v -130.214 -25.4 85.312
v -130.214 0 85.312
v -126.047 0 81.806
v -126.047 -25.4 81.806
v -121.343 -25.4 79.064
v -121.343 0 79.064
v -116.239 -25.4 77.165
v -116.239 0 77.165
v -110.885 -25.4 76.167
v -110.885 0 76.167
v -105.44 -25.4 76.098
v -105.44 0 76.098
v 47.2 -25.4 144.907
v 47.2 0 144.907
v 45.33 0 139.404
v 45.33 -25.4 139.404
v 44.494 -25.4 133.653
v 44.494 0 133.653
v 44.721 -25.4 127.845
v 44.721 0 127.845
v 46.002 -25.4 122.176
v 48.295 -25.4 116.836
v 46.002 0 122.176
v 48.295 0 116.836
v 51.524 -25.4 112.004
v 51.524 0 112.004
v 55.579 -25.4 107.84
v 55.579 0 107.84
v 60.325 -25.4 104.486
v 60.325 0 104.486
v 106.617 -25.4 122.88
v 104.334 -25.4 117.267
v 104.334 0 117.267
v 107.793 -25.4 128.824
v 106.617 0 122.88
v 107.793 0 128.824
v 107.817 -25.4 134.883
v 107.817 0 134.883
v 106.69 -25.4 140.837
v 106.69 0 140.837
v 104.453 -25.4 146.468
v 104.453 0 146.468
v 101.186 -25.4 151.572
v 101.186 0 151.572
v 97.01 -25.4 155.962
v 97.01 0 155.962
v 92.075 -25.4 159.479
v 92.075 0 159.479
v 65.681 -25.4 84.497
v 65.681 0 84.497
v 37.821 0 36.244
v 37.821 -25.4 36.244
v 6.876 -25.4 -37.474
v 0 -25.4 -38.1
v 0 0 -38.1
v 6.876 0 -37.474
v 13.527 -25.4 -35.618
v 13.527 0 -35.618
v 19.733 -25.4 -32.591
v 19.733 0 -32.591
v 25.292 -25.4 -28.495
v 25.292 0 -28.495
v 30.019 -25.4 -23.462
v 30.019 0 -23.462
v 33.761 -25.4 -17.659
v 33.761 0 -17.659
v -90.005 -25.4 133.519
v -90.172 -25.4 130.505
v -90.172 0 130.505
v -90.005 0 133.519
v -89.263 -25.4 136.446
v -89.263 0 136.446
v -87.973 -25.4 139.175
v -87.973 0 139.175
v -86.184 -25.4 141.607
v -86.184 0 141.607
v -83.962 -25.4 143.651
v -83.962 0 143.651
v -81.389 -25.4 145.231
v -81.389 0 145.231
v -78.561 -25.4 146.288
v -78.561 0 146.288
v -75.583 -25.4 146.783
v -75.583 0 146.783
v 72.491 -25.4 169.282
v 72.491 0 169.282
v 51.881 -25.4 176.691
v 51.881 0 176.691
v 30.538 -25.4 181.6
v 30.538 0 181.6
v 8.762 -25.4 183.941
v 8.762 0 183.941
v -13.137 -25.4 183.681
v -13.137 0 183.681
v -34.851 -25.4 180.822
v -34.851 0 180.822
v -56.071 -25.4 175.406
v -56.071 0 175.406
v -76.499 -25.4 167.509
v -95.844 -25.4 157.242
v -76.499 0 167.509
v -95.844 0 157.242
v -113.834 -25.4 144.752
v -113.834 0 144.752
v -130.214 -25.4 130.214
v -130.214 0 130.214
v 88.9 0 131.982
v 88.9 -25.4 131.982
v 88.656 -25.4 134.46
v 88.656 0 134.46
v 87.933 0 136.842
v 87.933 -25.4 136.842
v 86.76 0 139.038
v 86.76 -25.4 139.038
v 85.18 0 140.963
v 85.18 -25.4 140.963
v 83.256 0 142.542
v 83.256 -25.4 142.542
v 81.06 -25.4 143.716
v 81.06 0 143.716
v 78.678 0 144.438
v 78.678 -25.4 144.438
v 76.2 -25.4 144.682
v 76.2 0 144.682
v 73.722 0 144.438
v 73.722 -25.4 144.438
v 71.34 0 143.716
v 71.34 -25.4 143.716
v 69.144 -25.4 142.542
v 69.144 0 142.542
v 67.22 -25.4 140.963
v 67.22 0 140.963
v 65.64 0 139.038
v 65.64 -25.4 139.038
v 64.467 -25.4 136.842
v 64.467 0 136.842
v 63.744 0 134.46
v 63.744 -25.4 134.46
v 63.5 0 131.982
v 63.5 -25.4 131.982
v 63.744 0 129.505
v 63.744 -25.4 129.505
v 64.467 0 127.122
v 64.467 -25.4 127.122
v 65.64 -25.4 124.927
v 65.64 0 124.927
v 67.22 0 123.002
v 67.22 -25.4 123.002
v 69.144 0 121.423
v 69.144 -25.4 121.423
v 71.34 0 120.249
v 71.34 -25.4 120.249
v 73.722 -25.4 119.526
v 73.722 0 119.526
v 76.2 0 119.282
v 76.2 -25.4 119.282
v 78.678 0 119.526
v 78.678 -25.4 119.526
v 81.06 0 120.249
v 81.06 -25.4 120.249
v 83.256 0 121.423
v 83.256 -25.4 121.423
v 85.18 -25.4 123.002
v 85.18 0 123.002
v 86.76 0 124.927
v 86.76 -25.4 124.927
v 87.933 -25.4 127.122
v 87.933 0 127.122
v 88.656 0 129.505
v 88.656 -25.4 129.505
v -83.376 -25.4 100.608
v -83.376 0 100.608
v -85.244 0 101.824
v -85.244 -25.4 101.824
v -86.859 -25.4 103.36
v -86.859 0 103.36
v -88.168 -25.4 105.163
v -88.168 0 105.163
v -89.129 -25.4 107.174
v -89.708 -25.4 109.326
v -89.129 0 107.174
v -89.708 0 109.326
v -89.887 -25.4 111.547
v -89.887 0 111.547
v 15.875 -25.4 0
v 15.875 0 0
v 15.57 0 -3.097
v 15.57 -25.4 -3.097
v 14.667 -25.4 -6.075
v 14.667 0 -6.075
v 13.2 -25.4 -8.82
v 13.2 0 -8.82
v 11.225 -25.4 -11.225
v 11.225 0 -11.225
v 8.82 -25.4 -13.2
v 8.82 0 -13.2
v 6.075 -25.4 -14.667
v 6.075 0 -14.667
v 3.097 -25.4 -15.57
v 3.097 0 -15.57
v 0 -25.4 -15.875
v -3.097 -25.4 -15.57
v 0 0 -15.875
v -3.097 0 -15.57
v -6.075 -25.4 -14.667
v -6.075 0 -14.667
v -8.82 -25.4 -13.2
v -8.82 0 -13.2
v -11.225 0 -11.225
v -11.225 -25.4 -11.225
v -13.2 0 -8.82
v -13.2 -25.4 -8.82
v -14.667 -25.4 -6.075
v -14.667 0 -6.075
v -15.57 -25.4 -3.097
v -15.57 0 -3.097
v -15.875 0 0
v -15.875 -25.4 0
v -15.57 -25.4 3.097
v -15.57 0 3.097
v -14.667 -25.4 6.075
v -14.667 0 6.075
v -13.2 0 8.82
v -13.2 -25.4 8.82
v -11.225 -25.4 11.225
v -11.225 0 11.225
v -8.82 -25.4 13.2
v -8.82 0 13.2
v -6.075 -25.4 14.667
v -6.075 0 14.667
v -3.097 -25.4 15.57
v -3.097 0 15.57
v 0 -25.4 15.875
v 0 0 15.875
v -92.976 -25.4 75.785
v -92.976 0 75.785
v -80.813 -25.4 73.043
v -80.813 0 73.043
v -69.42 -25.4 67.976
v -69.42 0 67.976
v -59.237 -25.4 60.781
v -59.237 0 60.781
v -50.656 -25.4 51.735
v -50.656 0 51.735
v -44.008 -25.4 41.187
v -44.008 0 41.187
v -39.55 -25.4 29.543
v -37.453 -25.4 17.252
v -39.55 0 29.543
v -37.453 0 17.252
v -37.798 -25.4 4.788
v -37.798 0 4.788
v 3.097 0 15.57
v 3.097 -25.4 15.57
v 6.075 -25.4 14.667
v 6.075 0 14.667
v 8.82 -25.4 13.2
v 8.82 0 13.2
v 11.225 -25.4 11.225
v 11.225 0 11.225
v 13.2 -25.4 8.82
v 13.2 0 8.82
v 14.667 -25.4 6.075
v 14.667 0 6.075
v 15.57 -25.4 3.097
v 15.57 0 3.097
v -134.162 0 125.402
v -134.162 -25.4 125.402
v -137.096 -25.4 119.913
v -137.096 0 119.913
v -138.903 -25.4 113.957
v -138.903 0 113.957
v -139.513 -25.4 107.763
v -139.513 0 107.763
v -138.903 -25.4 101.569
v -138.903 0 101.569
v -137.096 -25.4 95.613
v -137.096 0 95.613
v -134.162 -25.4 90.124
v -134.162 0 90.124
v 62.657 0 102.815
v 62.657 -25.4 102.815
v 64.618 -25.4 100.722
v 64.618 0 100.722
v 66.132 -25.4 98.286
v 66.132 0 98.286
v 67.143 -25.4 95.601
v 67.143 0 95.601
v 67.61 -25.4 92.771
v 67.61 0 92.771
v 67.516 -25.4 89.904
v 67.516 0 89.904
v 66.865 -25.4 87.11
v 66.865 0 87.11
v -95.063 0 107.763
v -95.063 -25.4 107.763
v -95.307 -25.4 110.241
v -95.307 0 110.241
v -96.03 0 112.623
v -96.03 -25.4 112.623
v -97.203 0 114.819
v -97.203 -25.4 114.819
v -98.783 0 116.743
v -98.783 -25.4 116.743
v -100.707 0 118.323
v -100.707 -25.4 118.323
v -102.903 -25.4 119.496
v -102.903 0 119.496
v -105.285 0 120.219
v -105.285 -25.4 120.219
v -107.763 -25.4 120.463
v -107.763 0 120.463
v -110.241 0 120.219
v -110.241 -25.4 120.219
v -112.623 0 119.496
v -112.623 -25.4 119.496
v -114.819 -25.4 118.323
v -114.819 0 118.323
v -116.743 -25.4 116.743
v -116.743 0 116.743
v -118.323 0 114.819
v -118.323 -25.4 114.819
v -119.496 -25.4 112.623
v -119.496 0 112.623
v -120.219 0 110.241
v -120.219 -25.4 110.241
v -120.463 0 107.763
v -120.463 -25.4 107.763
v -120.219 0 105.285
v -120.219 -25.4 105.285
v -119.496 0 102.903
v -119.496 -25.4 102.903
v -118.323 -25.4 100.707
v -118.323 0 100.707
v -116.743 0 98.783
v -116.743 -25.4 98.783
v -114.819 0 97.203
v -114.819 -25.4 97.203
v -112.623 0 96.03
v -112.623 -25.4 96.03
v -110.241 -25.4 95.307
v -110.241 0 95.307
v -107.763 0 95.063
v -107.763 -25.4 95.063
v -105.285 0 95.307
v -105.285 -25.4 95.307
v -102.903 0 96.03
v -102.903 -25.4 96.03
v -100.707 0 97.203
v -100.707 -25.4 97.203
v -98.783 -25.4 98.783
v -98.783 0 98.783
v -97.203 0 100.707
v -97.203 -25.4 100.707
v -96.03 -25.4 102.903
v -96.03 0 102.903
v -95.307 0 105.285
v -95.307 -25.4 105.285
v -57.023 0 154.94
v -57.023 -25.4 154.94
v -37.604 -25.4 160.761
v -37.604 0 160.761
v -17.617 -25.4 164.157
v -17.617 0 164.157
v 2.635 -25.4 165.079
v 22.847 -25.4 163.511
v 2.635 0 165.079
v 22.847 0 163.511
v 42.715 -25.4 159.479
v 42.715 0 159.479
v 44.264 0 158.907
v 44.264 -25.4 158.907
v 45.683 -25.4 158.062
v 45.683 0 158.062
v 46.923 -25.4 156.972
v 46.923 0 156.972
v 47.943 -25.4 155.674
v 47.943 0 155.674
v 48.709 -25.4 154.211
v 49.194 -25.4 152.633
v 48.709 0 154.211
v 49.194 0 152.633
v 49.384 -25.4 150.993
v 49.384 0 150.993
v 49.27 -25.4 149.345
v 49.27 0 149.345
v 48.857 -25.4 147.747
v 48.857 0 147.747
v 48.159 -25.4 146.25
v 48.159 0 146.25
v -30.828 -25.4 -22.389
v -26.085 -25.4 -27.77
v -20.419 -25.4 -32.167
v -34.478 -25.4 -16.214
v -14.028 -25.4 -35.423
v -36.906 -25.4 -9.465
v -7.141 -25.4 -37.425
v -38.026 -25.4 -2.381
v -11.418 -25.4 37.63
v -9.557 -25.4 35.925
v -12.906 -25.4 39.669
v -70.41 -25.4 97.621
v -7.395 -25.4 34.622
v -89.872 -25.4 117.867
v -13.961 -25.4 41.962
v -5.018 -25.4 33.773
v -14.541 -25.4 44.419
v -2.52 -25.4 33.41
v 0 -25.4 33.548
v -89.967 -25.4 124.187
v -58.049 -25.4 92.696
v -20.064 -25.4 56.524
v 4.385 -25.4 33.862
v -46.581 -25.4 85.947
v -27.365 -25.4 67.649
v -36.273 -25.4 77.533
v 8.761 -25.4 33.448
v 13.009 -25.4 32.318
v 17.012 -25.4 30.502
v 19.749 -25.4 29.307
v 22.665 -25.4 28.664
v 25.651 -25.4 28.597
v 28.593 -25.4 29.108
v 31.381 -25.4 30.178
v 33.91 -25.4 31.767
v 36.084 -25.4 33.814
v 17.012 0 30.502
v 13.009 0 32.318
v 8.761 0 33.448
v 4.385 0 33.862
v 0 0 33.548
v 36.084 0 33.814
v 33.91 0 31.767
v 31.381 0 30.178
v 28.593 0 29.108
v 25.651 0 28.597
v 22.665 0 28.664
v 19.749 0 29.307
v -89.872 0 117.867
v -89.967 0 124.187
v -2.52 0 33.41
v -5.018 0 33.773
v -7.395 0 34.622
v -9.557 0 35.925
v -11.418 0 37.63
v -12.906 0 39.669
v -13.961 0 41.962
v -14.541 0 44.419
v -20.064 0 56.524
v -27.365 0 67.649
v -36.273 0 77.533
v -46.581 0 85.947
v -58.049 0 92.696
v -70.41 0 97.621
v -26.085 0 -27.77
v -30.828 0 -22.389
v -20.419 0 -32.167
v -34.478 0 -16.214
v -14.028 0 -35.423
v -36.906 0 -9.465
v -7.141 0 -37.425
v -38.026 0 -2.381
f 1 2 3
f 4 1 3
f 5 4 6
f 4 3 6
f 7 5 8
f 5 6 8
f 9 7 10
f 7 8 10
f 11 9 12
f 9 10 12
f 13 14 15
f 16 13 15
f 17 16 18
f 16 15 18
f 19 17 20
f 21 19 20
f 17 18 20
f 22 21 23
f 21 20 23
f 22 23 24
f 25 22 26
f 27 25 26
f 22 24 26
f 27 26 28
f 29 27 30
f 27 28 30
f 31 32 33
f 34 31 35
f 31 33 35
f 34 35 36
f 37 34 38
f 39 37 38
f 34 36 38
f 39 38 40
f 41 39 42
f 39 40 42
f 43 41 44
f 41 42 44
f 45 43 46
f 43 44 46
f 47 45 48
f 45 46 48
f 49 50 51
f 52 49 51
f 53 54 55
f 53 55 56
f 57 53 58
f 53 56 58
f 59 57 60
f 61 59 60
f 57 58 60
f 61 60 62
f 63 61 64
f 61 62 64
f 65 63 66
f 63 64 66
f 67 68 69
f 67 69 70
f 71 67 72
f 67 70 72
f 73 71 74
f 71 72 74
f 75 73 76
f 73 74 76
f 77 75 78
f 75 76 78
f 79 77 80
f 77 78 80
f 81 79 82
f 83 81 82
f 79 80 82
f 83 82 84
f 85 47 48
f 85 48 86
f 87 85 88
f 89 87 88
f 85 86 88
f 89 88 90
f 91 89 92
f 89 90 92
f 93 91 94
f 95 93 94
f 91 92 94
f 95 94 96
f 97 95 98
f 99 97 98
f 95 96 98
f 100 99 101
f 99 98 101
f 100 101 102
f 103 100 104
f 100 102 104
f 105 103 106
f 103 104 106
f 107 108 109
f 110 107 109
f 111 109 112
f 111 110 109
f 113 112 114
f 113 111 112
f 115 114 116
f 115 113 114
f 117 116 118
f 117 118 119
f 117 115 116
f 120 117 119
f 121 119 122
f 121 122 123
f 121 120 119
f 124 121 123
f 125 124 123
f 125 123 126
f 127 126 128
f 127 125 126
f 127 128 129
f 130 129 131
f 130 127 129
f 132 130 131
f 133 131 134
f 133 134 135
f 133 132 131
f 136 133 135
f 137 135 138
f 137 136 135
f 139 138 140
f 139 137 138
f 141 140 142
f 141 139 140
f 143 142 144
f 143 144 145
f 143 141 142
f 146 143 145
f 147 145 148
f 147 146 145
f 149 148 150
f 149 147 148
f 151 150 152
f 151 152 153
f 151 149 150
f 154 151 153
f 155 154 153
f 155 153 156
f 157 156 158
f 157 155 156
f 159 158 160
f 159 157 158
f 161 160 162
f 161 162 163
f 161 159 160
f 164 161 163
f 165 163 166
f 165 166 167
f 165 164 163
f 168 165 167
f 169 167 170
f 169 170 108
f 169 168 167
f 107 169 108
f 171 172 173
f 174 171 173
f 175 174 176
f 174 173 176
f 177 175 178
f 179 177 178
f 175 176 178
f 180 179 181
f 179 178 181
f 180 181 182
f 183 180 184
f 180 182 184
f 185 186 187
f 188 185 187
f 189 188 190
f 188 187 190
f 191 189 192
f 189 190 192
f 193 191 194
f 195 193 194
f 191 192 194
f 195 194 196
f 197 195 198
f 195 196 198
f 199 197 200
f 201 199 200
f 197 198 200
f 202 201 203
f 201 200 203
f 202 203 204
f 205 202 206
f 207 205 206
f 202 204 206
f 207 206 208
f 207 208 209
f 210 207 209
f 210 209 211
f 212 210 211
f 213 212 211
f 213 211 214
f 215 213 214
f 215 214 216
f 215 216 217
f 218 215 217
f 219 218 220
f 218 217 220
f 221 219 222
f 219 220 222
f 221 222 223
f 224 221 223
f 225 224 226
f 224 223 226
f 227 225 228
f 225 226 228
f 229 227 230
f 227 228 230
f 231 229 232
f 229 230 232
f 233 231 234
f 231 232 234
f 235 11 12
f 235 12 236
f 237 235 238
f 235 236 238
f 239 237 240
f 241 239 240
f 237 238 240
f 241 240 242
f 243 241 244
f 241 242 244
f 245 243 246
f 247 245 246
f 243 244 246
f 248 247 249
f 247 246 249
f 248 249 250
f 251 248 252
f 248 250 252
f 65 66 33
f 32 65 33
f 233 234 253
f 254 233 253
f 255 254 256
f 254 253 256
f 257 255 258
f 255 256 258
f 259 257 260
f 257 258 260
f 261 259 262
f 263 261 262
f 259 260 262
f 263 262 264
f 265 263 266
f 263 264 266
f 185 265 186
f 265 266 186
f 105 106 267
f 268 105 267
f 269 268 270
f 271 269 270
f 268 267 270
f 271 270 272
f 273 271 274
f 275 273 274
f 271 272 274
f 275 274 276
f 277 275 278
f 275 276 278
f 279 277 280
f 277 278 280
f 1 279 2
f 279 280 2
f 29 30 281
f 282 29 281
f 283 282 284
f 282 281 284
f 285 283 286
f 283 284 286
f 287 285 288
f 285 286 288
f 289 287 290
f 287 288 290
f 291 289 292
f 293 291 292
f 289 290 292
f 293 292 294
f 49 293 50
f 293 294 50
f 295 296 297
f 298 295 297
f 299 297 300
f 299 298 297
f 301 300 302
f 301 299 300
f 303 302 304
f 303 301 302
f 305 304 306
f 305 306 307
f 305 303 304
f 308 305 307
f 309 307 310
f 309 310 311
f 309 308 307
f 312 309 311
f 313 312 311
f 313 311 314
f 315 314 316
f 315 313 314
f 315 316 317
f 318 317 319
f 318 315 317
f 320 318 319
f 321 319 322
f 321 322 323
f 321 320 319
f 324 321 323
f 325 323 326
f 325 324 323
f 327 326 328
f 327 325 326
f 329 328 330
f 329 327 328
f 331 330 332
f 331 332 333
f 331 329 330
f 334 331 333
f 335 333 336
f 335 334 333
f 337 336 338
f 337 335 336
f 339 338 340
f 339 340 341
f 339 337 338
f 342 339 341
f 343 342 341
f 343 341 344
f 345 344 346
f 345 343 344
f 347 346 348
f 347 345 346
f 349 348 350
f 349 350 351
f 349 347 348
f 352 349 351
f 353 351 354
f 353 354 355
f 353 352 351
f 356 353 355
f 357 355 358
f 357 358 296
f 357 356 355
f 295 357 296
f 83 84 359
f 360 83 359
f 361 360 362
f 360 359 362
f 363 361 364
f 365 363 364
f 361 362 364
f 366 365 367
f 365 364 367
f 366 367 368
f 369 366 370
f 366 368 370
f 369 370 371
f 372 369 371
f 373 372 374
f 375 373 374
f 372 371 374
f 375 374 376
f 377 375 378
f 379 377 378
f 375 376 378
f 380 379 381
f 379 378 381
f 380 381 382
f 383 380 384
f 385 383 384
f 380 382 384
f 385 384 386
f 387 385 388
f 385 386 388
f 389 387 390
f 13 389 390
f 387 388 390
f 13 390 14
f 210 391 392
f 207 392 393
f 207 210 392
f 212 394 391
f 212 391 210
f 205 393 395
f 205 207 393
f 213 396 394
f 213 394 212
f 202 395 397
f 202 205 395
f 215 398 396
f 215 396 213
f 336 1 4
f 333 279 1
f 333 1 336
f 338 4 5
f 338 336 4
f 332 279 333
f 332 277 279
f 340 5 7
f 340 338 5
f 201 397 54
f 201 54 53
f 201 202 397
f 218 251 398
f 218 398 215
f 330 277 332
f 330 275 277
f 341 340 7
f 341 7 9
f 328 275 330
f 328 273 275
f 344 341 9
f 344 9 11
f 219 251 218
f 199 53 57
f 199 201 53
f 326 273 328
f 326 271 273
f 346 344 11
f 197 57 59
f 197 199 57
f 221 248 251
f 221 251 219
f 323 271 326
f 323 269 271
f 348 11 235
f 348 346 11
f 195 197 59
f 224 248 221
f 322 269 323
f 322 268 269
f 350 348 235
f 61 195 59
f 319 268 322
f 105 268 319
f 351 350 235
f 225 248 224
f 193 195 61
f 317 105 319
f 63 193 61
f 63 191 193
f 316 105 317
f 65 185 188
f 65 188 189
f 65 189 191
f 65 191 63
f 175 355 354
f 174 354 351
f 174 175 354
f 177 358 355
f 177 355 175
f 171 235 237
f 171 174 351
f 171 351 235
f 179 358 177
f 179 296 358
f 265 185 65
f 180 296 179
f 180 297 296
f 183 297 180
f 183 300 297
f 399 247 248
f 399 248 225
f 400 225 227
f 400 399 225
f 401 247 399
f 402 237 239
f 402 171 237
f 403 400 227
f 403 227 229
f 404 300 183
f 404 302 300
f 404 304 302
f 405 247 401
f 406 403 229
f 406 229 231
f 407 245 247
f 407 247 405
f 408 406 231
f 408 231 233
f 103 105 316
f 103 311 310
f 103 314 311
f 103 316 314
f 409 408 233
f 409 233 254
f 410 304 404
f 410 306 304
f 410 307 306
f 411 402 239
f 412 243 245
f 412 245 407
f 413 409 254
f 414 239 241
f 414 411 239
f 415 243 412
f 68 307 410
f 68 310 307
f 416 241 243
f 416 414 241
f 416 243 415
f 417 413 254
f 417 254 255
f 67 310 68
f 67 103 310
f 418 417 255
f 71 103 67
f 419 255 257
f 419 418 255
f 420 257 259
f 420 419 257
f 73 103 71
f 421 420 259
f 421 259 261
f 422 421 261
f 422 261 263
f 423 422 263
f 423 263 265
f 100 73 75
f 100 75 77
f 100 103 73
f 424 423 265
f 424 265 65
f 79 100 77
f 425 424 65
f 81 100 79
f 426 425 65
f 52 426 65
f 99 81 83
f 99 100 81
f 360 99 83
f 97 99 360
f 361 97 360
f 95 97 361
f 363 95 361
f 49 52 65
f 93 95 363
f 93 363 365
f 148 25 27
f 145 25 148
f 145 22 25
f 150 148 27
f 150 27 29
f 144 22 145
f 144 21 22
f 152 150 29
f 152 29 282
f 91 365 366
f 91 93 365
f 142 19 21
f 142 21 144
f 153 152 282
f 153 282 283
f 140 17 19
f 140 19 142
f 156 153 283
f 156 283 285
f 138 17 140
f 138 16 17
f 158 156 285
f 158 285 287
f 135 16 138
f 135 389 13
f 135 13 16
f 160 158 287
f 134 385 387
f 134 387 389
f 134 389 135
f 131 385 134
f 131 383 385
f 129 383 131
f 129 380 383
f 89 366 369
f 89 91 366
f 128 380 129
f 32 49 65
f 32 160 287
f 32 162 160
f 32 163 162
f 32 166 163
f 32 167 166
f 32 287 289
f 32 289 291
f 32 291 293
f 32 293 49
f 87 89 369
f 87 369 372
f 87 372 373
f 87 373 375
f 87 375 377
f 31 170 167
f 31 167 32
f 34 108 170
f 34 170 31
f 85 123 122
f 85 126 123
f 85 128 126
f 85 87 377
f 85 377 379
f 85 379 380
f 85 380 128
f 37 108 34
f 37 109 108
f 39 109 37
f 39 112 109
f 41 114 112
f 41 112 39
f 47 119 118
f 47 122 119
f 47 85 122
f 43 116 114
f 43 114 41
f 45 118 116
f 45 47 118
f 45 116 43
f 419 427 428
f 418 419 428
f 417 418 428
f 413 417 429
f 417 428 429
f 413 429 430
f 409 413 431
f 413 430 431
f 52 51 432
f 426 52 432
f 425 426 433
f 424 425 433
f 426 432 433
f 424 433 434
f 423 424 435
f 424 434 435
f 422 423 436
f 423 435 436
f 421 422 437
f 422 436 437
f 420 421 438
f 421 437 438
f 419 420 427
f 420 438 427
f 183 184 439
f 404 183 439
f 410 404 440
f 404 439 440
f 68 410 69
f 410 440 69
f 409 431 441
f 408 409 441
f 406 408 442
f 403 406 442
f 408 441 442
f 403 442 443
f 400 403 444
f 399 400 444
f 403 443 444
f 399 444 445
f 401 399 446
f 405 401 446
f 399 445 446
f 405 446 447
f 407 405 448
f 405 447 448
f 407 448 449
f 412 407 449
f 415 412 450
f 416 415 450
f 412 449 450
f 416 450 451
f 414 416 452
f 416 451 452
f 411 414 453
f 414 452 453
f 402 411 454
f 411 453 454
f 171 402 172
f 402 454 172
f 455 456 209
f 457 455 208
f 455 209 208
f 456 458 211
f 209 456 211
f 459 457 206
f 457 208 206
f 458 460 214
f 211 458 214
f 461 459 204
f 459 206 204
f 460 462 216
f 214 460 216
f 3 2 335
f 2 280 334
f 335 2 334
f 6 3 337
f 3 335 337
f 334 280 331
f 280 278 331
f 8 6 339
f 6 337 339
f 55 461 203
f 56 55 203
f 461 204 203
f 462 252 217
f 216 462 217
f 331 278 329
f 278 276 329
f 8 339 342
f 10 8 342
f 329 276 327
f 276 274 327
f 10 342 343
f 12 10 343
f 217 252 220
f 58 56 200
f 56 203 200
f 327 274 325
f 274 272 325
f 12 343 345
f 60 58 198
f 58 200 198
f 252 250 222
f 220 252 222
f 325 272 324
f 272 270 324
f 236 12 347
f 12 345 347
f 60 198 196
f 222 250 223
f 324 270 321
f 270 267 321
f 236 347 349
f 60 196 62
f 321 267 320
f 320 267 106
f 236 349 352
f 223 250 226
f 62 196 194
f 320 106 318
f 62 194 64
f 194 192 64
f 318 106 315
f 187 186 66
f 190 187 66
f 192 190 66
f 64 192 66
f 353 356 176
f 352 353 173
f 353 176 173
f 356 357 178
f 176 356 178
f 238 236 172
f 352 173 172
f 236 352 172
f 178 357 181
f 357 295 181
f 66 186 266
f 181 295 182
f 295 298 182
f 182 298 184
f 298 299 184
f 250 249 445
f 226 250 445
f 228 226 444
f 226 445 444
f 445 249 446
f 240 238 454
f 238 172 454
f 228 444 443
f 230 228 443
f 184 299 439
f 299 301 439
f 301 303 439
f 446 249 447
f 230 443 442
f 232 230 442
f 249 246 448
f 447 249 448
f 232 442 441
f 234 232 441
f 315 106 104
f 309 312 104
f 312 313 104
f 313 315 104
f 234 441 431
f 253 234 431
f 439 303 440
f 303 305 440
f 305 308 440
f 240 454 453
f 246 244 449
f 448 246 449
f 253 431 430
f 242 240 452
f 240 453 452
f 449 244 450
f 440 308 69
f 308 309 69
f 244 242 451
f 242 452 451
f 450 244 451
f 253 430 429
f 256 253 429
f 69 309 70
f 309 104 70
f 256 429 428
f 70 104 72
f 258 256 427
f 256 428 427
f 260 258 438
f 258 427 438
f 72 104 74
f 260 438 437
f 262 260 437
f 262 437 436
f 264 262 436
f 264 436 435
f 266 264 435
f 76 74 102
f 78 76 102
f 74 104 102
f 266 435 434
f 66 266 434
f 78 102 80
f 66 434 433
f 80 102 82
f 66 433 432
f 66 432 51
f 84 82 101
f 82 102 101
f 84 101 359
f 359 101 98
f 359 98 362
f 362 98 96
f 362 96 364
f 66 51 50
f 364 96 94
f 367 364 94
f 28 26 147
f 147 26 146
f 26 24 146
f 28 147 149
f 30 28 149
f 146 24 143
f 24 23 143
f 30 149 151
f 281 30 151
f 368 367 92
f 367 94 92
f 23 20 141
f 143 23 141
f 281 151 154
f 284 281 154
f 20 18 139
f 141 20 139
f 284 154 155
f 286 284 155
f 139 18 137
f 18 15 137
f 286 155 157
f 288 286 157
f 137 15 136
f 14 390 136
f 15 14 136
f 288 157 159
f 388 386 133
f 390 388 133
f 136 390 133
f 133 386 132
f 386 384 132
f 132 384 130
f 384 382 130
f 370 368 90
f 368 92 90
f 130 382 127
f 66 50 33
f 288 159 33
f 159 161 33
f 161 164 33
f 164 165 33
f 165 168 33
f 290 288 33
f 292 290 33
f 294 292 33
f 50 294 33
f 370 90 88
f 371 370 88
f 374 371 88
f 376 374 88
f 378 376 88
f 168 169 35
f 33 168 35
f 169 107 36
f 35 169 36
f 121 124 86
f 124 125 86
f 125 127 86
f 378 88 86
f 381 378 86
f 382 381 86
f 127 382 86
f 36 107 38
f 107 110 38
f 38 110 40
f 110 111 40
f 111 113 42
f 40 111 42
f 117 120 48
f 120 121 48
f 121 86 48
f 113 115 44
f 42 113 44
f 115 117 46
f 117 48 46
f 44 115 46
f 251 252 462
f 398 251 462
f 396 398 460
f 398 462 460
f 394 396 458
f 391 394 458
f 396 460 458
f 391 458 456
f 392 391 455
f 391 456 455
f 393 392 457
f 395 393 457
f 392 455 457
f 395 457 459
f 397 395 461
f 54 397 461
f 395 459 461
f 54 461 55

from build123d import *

# Parameters (mm, degrees)
F0_R     = 12.7
F1_DEPTH = 25.4


with BuildPart() as f1:
    # F0 (on Front) → F1 (new body)
    with BuildSketch(Plane.XZ):
        with BuildLine():
            ThreePointArc((-105.440213, 76.098159), (-54.724054, 56.469184), (-37.797935, 4.788124))
            ThreePointArc((-37.797935, 4.788124), (-28.58354, -25.191095), (0, -38.1))
            ThreePointArc((0, -38.1), (19.733421, -32.591442), (33.760663, -17.658641))
            Line((33.760663, -17.658641), (104.333886, 117.266737))
            ThreePointArc((104.333886, 117.266737), (106.690251, 140.83705), (92.075, 159.478578))
            ThreePointArc((92.075, 159.478578), (-24.036398, 182.574571), (-130.213714, 130.213714))
            ThreePointArc((-130.213714, 130.213714), (-139.513073, 107.763073), (-130.213714, 85.312433))
            ThreePointArc((-130.213714, 85.312433), (-118.831388, 78.004799), (-105.440213, 76.098159))
        make_face()
        with BuildLine():
            ThreePointArc((0, 15.875), (11.22532, 11.22532), (15.875, 0))
            ThreePointArc((15.875, 0), (-11.22532, -11.22532), (0, 15.875))
        make_face(mode=Mode.SUBTRACT)
        with Locations((-107.763073, 107.763073)):
            Circle(F0_R, mode=Mode.SUBTRACT)
        with BuildLine():
            ThreePointArc((17.011753, 30.501736), (8.760735, 33.448122), (0, 33.548198))
            ThreePointArc((0, 33.548198), (-9.556693, 35.925334), (-14.541131, 44.418657))
            ThreePointArc((-14.541131, 44.418657), (-41.266263, 81.937069), (-83.376373, 100.607971))
            ThreePointArc((-83.376373, 100.607971), (-88.168492, 105.162713), (-89.886657, 111.546911))
            ThreePointArc((-89.886657, 111.546911), (-89.905581, 121.02761), (-90.171772, 130.50459))
            ThreePointArc((-90.171772, 130.50459), (-86.184302, 141.607355), (-75.583098, 146.782851))
            ThreePointArc((-75.583098, 146.782851), (-17.617296, 164.157366), (42.715256, 159.478578))
            ThreePointArc((42.715256, 159.478578), (48.987823, 153.432961), (47.199631, 144.906711))
            ThreePointArc((47.199631, 144.906711), (46.002172, 122.176475), (60.325, 104.485965))
            ThreePointArc((60.325, 104.485965), (67.14271, 95.600952), (65.680907, 84.49745))
            Line((65.680907, 84.49745), (37.821481, 36.243509))
            ThreePointArc((37.821481, 36.243509), (28.593318, 29.107942), (17.011753, 30.501736))
        make_face(mode=Mode.SUBTRACT)
        with Locations((76.2, 131.982272)):
            Circle(F0_R, mode=Mode.SUBTRACT)
    extrude(amount=F1_DEPTH)


solid = f1.part
